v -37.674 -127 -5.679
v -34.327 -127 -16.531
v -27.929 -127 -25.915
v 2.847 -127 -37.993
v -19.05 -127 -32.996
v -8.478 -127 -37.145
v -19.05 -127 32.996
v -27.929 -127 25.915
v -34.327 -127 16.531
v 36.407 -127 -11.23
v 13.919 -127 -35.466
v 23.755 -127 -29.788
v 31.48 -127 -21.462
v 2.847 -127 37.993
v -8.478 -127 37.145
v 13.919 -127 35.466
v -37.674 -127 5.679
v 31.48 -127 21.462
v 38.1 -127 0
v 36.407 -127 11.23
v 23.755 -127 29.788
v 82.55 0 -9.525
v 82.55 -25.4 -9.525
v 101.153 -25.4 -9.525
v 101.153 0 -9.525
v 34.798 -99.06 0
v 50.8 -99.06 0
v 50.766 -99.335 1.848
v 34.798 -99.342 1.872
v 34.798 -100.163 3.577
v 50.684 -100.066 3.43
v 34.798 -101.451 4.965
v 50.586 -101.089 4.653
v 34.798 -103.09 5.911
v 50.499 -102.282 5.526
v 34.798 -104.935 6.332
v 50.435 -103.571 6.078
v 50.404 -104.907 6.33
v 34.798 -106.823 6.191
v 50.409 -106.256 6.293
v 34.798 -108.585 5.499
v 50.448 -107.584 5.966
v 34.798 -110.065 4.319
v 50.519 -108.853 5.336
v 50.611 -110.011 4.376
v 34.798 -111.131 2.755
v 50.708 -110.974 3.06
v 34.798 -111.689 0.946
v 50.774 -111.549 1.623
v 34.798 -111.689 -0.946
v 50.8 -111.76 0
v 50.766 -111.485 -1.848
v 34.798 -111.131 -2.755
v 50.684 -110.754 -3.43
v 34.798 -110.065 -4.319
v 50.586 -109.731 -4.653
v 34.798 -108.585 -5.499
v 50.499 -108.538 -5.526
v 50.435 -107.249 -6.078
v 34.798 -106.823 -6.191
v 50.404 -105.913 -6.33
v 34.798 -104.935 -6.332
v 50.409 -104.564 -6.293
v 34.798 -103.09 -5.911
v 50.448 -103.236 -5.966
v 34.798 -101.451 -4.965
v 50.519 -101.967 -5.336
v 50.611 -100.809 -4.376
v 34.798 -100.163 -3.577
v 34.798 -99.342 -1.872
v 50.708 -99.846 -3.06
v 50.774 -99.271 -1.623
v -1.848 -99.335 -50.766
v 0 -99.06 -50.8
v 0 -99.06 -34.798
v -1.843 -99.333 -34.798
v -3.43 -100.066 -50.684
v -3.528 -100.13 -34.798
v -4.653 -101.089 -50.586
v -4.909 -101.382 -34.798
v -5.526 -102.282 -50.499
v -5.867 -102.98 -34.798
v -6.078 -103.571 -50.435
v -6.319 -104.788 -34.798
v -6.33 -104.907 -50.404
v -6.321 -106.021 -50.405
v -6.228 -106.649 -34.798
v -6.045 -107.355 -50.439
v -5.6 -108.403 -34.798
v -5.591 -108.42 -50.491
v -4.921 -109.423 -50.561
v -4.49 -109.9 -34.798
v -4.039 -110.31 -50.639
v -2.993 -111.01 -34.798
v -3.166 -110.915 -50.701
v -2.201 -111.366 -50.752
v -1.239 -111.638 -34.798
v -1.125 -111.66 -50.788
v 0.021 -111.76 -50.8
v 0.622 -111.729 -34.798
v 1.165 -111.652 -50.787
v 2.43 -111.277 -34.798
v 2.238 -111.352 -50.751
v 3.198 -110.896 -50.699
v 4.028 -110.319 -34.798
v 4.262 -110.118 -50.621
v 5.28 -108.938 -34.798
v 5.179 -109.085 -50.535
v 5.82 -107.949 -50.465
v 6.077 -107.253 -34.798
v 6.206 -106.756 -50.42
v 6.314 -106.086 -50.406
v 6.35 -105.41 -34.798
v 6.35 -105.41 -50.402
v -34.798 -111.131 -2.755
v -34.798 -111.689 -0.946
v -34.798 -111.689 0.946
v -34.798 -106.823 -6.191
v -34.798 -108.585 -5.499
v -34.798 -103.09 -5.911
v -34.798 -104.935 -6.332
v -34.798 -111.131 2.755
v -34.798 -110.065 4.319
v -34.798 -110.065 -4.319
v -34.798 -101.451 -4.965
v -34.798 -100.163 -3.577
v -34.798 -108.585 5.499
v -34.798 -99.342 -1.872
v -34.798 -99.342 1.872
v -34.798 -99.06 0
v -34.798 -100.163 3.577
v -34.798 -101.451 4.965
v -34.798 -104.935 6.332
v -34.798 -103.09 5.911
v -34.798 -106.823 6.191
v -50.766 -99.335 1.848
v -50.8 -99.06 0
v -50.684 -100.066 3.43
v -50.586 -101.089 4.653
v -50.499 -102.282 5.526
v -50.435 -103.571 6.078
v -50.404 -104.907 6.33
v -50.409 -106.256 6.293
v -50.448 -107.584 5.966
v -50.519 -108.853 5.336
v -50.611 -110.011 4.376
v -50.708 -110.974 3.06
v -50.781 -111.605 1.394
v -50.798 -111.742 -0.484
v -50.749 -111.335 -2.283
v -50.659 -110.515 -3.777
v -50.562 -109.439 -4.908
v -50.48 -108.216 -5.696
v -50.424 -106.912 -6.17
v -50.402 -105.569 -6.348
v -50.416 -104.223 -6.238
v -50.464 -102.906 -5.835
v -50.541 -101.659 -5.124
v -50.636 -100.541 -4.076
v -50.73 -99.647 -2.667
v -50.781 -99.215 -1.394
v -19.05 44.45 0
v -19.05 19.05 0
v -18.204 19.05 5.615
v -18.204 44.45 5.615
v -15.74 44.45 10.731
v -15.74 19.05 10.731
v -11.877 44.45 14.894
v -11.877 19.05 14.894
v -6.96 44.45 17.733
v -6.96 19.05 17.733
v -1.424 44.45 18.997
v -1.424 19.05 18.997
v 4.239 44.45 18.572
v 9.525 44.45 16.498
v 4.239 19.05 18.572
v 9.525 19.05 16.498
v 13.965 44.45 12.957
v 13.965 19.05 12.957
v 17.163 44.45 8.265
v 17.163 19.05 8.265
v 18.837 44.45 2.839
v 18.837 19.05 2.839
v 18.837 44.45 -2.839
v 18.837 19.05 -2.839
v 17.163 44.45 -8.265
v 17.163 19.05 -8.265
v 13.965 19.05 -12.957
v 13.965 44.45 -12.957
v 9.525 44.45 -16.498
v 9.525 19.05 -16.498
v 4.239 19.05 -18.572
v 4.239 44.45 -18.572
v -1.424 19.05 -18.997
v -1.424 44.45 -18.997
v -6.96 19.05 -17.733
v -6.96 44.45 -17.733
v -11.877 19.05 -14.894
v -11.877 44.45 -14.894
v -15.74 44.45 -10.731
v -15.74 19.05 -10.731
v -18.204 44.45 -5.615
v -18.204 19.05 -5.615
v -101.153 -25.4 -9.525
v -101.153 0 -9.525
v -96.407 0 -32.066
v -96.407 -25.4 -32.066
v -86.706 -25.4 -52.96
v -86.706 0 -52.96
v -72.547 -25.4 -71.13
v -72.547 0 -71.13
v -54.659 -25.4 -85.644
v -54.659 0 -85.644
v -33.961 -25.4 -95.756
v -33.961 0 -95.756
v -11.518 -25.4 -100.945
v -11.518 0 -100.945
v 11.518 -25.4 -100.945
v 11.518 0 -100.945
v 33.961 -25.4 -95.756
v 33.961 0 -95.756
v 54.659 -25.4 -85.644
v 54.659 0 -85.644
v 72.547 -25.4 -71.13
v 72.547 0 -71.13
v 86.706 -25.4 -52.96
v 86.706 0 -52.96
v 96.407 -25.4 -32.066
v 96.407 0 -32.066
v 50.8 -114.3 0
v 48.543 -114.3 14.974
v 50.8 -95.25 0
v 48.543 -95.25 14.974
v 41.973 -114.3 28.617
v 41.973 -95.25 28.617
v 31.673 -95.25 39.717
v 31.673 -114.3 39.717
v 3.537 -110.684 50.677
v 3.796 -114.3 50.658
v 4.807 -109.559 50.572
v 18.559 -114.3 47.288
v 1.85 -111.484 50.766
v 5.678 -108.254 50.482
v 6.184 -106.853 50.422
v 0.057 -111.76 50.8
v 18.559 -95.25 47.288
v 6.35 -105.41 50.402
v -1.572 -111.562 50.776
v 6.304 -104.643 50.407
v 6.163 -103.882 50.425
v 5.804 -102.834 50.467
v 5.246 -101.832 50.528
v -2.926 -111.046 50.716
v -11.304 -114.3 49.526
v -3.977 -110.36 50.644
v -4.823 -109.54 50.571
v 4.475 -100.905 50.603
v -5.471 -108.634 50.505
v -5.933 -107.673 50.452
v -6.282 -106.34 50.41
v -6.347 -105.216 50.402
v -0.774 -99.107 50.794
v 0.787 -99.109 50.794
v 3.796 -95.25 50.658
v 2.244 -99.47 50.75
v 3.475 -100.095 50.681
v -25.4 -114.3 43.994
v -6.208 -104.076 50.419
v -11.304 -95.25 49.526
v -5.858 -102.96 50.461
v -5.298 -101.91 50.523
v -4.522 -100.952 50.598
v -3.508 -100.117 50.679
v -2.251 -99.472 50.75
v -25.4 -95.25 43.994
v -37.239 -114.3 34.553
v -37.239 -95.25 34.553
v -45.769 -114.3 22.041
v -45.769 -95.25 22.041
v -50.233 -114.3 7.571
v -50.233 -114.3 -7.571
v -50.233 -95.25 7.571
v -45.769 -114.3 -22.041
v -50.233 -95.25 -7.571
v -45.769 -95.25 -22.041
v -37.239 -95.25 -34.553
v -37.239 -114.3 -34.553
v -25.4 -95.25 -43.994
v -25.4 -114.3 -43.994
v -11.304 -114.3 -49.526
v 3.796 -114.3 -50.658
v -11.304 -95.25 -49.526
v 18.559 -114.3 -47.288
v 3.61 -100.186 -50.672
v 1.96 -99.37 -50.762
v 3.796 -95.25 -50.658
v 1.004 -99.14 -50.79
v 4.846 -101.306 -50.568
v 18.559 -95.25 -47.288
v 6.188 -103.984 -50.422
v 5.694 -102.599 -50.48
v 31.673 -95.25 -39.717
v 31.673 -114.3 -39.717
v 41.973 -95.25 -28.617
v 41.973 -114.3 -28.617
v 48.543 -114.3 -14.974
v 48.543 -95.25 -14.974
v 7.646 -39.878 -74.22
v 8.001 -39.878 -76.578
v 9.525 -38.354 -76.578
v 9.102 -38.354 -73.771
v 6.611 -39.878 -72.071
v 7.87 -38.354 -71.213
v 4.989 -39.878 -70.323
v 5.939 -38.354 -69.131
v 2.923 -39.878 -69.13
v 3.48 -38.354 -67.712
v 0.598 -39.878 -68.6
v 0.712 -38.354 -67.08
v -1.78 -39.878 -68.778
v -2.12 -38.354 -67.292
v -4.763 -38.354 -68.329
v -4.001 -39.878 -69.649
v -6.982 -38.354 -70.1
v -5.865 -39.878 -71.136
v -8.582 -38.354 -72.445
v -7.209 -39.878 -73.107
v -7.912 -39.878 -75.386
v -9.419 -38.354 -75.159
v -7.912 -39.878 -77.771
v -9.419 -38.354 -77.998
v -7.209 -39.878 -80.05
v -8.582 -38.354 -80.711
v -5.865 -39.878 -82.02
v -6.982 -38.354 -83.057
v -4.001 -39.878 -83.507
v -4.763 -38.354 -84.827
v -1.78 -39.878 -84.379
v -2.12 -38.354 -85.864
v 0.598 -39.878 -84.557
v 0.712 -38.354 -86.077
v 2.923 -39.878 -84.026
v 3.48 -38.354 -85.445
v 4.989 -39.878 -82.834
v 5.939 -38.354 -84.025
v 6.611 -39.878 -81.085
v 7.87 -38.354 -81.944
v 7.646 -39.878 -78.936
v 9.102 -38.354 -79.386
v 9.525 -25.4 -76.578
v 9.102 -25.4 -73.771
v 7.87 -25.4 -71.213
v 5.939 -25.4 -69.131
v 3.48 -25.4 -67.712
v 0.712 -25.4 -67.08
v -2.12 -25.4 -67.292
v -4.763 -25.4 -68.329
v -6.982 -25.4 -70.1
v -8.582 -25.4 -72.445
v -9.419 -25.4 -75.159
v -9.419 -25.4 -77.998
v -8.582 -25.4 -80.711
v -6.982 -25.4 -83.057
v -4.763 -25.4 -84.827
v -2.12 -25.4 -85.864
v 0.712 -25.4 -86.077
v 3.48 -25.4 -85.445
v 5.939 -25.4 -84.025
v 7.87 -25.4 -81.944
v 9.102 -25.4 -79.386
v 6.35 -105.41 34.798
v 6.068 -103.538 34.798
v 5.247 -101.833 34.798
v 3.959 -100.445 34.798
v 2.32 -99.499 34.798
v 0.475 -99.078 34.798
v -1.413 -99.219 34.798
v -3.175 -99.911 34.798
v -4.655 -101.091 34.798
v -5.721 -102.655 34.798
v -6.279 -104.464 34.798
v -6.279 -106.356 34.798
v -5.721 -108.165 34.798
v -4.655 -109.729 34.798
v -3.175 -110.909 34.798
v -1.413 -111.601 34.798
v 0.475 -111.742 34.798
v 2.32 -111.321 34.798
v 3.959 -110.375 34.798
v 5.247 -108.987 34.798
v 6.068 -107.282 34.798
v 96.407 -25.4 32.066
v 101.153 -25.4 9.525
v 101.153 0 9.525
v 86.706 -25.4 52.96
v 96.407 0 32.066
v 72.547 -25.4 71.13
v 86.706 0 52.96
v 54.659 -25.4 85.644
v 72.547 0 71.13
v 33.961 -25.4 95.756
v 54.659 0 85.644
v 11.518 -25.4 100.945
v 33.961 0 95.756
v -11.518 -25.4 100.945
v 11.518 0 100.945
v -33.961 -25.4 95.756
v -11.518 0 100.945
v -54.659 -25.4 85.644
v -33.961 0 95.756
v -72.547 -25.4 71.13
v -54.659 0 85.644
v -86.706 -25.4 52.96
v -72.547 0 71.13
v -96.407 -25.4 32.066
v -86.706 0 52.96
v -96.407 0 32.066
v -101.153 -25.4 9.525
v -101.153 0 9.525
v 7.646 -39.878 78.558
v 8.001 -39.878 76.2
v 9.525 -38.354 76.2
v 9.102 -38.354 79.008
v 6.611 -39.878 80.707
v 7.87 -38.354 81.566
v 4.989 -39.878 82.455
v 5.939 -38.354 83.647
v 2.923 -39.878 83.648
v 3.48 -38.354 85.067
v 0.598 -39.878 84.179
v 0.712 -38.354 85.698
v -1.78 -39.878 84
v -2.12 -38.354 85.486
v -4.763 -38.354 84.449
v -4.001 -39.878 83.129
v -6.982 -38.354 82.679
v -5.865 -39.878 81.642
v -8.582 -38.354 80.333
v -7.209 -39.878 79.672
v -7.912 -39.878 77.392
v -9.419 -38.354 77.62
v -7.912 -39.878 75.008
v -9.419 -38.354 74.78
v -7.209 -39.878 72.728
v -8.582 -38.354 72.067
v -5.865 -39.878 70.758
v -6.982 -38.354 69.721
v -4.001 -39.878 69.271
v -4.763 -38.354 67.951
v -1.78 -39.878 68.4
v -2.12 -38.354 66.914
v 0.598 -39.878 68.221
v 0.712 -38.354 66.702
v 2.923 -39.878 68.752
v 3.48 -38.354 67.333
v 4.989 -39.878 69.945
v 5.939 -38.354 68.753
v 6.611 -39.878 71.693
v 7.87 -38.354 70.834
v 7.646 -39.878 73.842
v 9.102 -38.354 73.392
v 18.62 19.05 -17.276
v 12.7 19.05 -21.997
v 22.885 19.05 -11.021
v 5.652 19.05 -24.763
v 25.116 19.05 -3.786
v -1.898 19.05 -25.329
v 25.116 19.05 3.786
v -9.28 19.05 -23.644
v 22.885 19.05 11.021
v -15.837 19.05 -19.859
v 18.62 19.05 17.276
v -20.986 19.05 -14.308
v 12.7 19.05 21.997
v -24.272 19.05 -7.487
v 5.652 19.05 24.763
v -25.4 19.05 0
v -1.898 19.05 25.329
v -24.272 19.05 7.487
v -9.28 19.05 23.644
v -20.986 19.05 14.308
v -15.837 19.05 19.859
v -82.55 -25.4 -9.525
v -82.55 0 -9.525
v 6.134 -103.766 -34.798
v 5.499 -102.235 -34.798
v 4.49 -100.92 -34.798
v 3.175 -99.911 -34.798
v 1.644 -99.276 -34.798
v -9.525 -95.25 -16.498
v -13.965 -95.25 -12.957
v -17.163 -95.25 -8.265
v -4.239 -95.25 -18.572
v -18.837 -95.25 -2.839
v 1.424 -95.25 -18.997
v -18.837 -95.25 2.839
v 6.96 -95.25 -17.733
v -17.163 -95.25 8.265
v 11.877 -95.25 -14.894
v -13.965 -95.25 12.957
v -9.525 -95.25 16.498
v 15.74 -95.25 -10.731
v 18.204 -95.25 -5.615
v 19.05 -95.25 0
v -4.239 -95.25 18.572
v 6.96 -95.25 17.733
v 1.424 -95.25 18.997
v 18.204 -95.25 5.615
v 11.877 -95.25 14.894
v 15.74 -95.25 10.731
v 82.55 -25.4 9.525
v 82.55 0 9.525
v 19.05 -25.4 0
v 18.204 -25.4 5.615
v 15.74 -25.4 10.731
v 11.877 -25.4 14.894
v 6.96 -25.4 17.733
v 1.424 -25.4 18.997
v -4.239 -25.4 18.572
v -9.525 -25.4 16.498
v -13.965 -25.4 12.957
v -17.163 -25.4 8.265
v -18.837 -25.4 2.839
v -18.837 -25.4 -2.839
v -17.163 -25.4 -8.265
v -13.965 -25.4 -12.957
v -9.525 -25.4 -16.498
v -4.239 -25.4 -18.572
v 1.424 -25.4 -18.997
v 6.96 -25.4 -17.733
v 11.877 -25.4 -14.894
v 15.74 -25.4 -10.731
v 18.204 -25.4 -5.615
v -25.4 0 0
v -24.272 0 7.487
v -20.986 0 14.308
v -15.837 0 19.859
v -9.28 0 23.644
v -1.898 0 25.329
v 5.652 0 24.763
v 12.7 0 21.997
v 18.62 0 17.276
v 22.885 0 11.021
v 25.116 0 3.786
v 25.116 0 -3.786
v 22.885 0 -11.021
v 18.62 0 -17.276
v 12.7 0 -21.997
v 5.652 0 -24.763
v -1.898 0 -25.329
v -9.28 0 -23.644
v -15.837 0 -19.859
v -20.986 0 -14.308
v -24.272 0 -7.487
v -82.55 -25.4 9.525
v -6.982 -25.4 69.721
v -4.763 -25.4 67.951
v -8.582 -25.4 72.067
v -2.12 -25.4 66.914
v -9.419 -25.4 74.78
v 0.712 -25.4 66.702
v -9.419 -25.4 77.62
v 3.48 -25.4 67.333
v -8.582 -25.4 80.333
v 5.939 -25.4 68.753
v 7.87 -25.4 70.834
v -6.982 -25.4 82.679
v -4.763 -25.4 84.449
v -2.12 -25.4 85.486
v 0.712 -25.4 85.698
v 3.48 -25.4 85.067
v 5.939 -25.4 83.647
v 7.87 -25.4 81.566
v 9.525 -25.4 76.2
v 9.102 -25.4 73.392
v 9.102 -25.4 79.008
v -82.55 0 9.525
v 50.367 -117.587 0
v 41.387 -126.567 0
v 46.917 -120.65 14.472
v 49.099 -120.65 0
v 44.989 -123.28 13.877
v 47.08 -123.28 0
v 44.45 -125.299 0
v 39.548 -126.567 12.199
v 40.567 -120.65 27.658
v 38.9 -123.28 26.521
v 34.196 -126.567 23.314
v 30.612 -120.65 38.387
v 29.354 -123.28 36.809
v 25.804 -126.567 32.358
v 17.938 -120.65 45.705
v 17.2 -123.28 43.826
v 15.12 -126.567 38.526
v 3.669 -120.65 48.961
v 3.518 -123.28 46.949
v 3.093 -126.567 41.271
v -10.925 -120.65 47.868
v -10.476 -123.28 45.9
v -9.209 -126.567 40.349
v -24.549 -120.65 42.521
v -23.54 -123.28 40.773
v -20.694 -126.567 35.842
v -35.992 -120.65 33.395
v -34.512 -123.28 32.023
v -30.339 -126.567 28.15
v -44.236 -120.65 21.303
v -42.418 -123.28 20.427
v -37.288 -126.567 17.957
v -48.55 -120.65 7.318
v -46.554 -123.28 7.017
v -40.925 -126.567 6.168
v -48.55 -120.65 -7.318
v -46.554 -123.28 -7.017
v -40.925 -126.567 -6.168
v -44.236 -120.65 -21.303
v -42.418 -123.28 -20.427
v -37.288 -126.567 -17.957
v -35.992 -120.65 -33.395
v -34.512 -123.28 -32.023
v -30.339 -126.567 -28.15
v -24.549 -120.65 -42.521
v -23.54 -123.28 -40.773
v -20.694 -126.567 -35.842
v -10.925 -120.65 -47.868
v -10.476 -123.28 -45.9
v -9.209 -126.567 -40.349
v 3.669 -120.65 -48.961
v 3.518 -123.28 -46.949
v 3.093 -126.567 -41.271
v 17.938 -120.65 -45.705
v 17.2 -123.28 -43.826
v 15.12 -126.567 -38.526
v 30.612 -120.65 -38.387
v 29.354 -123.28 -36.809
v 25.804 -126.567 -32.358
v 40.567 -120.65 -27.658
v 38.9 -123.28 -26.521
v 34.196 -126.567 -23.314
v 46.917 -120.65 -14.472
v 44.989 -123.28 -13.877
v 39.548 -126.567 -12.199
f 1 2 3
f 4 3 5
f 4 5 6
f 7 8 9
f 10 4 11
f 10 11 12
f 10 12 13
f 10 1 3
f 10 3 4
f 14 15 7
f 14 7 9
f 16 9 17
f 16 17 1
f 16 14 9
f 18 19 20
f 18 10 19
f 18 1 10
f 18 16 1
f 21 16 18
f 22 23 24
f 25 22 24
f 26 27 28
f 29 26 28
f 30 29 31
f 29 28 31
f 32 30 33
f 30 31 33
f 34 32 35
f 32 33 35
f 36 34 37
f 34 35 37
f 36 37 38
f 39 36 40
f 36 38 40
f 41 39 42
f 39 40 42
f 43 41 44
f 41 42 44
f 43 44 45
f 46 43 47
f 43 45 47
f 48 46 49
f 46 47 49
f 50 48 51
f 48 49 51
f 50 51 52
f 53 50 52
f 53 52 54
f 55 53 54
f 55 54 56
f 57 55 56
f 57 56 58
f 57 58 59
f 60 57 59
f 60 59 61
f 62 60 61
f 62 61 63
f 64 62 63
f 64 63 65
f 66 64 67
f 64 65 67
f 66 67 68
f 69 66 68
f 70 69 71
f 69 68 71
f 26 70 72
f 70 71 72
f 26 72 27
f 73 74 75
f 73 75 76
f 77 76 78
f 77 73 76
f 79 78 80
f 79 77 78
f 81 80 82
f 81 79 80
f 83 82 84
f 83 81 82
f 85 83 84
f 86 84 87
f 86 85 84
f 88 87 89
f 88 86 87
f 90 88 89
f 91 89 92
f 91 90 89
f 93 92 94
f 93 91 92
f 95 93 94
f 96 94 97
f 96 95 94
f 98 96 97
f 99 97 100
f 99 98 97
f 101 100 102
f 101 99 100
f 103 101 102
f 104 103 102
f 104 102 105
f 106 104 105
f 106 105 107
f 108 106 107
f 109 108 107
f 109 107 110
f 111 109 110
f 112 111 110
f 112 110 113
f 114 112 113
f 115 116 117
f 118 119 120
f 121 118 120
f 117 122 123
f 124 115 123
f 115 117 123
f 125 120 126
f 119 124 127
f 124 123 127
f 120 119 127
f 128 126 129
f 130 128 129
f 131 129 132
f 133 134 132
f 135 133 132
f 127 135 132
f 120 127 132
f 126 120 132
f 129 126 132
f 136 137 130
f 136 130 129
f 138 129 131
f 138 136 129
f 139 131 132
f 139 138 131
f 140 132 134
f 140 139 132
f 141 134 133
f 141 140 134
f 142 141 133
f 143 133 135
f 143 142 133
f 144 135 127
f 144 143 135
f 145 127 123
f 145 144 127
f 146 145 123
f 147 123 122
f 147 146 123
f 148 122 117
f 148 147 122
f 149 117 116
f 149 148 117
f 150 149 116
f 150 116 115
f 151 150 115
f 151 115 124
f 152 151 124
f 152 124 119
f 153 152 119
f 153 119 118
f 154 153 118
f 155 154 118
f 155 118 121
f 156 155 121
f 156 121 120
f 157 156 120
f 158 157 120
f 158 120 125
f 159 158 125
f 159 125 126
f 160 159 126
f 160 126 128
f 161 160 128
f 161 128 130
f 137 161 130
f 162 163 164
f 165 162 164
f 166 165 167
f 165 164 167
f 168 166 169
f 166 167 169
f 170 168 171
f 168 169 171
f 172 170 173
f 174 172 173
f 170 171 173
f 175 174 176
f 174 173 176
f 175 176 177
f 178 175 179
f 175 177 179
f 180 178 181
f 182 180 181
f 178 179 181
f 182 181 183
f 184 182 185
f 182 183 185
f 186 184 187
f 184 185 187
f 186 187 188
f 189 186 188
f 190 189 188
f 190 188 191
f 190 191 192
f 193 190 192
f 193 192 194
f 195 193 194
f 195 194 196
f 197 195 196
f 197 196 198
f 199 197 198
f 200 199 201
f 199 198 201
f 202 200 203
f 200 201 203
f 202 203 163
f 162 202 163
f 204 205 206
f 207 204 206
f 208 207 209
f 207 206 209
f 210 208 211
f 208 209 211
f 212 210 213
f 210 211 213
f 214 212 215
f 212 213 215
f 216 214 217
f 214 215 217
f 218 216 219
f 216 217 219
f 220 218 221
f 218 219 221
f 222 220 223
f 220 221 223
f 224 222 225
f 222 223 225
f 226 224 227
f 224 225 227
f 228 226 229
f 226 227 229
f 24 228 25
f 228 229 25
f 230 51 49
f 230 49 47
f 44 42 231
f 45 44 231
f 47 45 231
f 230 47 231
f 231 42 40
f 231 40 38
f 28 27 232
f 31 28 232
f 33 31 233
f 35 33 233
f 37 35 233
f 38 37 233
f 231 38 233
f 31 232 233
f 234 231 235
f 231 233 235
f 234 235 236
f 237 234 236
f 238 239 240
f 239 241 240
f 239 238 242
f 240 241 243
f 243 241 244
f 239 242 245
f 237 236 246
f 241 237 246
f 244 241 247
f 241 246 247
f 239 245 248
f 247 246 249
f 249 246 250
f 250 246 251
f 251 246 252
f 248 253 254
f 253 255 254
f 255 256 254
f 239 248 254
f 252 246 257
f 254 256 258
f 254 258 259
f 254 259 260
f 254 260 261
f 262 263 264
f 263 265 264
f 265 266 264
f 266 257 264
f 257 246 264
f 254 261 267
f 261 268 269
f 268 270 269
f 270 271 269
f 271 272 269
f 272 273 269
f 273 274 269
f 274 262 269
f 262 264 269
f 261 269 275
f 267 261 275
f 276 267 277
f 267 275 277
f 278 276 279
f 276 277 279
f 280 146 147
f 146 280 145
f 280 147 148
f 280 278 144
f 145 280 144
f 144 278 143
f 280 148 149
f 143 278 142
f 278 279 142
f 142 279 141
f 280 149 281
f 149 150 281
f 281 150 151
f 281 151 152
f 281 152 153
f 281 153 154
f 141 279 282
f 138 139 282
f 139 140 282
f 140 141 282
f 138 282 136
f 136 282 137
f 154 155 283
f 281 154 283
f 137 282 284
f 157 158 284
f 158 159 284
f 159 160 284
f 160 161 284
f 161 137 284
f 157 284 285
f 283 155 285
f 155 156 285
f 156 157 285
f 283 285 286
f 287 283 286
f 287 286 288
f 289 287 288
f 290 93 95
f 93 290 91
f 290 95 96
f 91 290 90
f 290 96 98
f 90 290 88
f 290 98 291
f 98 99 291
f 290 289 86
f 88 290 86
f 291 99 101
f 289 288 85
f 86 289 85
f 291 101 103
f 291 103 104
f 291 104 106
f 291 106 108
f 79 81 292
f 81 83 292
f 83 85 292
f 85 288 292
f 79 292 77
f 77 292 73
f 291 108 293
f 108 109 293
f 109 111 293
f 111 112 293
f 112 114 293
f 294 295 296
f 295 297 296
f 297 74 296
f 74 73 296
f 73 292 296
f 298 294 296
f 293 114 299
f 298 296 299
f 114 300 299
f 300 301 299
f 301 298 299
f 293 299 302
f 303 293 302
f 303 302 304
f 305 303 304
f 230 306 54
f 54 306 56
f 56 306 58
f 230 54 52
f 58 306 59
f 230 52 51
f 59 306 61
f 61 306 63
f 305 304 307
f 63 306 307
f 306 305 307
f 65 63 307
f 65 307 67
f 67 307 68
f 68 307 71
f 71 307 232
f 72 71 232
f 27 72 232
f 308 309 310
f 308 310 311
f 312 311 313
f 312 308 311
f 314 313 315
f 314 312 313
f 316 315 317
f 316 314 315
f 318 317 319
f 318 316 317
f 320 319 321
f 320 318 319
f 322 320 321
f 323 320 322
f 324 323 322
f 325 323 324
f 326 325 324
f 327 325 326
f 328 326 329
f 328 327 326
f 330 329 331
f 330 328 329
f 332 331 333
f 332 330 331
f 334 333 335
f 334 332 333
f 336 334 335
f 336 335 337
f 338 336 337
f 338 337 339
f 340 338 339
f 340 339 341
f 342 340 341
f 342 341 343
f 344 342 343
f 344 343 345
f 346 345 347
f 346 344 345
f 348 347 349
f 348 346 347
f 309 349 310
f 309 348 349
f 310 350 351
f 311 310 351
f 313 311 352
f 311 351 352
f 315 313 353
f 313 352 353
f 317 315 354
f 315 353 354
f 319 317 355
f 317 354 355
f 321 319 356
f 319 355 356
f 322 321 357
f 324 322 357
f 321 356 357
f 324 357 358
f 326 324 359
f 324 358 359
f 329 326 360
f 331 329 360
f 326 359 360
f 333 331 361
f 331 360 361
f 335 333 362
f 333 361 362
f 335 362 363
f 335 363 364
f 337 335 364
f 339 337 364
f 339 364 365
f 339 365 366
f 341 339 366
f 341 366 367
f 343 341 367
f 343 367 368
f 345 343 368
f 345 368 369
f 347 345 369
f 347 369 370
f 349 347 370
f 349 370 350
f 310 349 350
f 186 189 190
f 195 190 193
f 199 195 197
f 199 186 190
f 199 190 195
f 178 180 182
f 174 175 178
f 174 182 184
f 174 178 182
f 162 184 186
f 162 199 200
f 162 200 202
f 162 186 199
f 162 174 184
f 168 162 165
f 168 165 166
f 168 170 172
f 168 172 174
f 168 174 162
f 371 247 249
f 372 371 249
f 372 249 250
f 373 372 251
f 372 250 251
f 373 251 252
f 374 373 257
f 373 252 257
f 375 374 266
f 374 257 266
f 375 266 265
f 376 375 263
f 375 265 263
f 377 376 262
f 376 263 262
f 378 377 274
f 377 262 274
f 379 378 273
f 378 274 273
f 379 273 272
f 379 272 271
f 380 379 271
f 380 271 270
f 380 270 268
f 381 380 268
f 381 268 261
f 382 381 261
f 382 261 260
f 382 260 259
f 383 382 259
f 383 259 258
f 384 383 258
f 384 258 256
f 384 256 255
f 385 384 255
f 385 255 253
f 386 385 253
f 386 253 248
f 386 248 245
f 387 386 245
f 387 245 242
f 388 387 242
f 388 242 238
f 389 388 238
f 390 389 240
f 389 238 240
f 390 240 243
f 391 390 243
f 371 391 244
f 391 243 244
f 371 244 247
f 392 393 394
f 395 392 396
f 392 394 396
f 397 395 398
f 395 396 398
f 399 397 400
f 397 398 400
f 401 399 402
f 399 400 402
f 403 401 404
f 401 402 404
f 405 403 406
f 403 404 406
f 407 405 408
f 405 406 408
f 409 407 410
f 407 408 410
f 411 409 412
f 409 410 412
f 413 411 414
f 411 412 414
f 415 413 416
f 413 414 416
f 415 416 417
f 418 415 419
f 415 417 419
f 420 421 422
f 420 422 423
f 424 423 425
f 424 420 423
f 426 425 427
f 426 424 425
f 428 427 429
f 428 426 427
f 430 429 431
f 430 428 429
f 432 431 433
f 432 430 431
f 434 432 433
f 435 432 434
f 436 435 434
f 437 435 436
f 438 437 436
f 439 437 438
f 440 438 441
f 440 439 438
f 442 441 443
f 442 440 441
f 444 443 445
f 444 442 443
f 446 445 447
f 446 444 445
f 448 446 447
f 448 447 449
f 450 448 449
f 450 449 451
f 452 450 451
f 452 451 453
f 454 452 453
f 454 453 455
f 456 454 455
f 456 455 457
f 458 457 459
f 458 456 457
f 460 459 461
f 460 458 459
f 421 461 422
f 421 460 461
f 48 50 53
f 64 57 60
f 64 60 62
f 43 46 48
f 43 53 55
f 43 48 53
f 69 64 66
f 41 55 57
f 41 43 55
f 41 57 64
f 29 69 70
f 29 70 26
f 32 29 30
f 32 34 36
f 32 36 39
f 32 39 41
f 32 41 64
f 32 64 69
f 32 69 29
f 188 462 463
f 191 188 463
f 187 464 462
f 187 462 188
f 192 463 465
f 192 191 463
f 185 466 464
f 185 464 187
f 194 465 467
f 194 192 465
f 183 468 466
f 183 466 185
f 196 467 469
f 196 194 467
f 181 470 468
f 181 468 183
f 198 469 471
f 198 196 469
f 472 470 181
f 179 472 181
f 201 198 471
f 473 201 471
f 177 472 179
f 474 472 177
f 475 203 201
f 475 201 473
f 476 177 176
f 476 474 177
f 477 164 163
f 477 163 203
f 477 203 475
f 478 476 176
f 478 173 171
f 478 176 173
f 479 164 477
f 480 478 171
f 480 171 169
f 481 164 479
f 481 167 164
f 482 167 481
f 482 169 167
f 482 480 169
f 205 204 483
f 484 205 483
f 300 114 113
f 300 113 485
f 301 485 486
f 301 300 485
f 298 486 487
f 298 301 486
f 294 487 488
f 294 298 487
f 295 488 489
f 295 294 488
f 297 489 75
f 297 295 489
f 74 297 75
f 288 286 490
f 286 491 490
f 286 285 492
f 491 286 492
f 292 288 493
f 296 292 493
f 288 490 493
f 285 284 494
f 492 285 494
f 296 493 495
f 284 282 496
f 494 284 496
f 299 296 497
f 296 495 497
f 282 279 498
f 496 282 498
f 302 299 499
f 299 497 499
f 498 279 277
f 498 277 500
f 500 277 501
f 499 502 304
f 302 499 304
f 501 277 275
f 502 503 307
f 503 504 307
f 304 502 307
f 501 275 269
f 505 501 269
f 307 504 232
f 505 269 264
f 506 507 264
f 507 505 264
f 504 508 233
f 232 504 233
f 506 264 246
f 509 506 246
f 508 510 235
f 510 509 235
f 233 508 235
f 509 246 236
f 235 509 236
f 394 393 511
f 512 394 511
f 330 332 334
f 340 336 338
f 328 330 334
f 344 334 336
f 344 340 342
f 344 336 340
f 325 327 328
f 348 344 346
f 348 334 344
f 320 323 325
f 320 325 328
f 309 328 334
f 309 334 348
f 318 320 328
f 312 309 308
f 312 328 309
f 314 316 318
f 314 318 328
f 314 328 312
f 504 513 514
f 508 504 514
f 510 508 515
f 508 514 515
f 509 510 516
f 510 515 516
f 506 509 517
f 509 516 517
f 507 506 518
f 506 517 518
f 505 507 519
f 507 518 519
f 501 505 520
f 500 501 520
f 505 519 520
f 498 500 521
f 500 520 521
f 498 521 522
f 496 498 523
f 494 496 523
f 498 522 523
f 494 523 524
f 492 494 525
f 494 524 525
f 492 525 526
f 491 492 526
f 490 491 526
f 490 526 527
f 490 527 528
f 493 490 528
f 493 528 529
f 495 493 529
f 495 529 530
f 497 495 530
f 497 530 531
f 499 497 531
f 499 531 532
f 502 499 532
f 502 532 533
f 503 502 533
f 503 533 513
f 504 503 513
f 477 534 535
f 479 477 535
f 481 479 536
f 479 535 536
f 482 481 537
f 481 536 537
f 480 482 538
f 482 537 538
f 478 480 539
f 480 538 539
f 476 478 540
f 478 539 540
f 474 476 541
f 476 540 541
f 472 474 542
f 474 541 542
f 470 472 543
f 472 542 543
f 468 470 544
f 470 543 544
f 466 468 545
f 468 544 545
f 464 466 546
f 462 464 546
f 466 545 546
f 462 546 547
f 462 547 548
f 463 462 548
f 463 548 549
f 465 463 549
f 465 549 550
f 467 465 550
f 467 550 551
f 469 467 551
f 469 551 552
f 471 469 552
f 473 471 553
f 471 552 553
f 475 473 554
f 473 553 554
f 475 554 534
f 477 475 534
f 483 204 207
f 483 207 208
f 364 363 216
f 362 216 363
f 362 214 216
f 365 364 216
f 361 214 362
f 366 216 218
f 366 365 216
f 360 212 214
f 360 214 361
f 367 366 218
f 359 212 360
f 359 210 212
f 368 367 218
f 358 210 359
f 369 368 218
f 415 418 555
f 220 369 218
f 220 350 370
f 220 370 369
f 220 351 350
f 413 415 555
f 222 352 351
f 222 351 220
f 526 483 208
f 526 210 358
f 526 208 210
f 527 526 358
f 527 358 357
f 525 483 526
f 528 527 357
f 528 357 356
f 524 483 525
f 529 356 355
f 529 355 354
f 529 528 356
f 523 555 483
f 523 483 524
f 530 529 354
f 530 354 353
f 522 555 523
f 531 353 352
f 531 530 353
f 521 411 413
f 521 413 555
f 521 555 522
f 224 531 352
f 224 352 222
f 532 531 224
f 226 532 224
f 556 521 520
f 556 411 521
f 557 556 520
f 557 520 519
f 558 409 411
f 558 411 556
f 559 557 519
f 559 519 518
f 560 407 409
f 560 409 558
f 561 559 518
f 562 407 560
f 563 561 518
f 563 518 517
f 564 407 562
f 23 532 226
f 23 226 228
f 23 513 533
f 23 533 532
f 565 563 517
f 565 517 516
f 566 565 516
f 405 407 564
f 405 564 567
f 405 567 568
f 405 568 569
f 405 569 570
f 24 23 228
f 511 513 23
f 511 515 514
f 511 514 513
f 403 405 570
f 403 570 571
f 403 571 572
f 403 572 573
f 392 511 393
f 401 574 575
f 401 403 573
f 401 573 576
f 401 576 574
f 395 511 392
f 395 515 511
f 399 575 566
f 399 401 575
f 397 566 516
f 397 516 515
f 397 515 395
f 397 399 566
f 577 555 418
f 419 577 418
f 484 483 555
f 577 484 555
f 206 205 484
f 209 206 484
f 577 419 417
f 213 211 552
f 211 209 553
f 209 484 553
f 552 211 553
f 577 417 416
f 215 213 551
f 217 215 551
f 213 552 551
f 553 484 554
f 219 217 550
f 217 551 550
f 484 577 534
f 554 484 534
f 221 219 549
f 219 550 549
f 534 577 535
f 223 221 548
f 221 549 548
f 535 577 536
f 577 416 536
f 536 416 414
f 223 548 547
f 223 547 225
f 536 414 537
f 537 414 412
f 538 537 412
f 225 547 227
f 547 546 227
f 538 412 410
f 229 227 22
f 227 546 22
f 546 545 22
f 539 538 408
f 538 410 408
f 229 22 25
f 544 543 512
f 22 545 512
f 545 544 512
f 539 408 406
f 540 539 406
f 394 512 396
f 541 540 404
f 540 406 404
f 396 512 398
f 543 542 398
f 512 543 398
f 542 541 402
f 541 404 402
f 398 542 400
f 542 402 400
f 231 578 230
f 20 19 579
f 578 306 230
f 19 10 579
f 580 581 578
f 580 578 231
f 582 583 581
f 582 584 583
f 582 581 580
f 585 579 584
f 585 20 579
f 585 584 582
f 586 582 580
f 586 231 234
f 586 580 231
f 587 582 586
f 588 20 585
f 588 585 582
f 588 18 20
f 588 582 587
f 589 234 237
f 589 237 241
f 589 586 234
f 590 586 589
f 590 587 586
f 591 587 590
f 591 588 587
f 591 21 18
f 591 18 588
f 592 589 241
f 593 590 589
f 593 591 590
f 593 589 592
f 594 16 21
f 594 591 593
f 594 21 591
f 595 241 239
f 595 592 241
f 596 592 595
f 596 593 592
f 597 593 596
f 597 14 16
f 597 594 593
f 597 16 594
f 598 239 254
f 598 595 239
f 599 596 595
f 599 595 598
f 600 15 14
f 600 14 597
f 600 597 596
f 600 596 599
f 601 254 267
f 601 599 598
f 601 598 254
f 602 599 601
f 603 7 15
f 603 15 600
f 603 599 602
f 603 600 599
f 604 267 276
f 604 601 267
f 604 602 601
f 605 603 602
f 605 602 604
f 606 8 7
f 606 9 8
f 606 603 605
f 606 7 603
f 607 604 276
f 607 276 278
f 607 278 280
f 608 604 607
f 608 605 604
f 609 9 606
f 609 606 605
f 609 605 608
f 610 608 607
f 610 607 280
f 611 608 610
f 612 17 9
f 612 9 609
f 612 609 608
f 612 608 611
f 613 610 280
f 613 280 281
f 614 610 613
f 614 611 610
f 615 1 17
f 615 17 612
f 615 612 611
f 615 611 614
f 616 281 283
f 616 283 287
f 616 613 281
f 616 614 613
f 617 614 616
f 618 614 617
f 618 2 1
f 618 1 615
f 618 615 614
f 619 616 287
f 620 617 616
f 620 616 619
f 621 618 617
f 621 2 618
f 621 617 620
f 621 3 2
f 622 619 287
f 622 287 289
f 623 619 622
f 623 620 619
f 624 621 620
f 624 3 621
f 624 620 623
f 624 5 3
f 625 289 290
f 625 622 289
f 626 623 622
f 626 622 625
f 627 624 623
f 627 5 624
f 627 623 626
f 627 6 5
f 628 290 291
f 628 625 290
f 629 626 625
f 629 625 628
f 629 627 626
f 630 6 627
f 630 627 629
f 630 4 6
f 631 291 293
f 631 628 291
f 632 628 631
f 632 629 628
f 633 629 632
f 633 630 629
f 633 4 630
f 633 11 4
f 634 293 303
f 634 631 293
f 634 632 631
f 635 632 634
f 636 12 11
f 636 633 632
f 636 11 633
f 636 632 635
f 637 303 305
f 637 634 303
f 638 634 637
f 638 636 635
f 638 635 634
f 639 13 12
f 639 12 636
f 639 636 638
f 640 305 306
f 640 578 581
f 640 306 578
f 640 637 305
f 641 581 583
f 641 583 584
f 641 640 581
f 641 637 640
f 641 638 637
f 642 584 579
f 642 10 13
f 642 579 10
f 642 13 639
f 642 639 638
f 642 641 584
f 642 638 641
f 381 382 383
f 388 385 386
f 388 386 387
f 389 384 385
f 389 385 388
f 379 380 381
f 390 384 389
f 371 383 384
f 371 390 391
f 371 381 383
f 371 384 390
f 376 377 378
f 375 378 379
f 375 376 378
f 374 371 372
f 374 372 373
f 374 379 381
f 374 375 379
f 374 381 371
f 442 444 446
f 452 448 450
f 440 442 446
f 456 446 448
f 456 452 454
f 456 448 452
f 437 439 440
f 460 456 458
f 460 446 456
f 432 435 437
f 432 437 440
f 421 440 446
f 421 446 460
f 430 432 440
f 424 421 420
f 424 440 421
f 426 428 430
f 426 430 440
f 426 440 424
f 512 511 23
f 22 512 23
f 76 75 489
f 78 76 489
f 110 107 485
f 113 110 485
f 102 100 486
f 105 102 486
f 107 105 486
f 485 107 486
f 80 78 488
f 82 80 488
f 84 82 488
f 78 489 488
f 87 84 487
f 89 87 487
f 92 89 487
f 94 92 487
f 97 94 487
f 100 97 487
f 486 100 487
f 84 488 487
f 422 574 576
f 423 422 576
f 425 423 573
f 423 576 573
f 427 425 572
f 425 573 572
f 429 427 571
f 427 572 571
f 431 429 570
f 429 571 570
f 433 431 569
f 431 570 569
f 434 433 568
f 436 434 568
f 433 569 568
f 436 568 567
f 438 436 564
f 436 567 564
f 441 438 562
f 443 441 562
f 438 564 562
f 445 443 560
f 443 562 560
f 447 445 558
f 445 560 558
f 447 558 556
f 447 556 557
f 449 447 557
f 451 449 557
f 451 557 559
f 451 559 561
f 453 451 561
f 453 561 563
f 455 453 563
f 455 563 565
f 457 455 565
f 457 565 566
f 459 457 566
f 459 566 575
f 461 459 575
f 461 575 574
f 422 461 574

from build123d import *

# Parameters (mm, degrees)
F0_R      = 101.6
F1_DEPTH  = 19.05
F2_R      = 19.05
F3_DEPTH  = 76.2
F4_R      = 50.8
F4_R_2    = 19.05
F5_DEPTH  = 31.75
F6_R      = 9.525
F7_DEPTH  = 20.828
F8_R      = 12.7
F9_R      = 25.4
F10_DEPTH = 19.05
F11_R     = 19.05
F12_DEPTH = 25.4
F13_DEPTH = 25.4
F15_DEPTH = 27.94
F17_DEPTH = 25.4
F18_SIZE2 = 1.524
F18_SIZE  = 1.524
F20_R     = 6.35
F21_DEPTH = 16.002
F24_DEPTH = 16.002
F26_R     = 6.35
F27_DEPTH = 16.002
F29_R     = 6.35
F30_DEPTH = 16.002


with BuildPart() as f1:
    # F0 (on Front) → F1 (new body)
    with BuildSketch(Plane.XZ):
        Circle(F0_R)
    extrude(amount=F1_DEPTH)

    # F2 (on face) → F3 (join)
    with BuildSketch(Plane.XZ.offset(19.05)):
        Circle(F2_R)
    extrude(amount=F3_DEPTH)

    # F4 (on face) → F5 (join)
    with BuildSketch(Plane.XZ.offset(95.25)):
        Circle(F4_R)
        Circle(F4_R_2, mode=Mode.SUBTRACT)
        Circle(F4_R_2)
    extrude(amount=F5_DEPTH)

    # F6 (on face) → F7 (join)
    with BuildSketch(Plane.XZ.offset(19.05)):
        with Locations((0, 76.2)):
            Circle(F6_R)
        with Locations((0, -76.578163)):
            Circle(F6_R)
    extrude(amount=F7_DEPTH)

    # F8
    f8_edges = [f1.edges().sort_by_distance(p)[0] for p in [
        (-50.8, -127, 0),
    ]]
    fillet(f8_edges, radius=F8_R)

    # F9 (on face) → F10 (join)
    with BuildSketch(Plane(origin=(0, 0, 0), x_dir=(-1, 0, 0), z_dir=(0, 1, 0))):
        Circle(F9_R)
    extrude(amount=F10_DEPTH)

    # F11 (on face) → F12 (join)
    with BuildSketch(Plane(origin=(0, 19.05, 0), x_dir=(-1, 0, 0), z_dir=(0, 1, 0))):
        Circle(F11_R)
    extrude(amount=F12_DEPTH)

    # F0 (on Front) → F13 (join)
    with BuildSketch(Plane.XZ):
        Circle(F0_R)
    extrude(amount=F13_DEPTH)

    # F14 (on face) → F15 (cut)
    with BuildSketch(Plane.XZ.offset(25.4)):
        Polygon((82.55, 9.525), (82.55, 0), (82.55, -9.525), (120.547909, -9.525), (120.547909, 9.525), align=None)
    extrude(amount=-F15_DEPTH, mode=Mode.SUBTRACT)

    # F16 (on face) → F17 (cut)
    with BuildSketch(Plane.XZ.offset(25.4)):
        Polygon((-82.55, -9.525), (-82.55, 0), (-82.55, 9.525), (-117.500194, 9.525), (-117.500194, -9.525), align=None)
    extrude(amount=-F17_DEPTH, mode=Mode.SUBTRACT)

    # F18
    f18_edges = [f1.edges().sort_by_distance(p)[0] for p in [
        (-9.525, -39.878, 76.2),
        (-9.525, -39.878, -76.578163),
    ]]
    chamfer(f18_edges, length=F18_SIZE, length2=F18_SIZE2)

    # F20 (on offset) → F21 (cut)
    with BuildSketch(Plane.XY.offset(50.8)):
        with Locations((0, -105.41)):
            Circle(F20_R)
    extrude(amount=-F21_DEPTH, mode=Mode.SUBTRACT)

    # F23 (on offset) → F24 (cut)
    with BuildSketch(Plane.XY.offset(-50.8)):
        with BuildLine():
            ThreePointArc((0, -99.06), (-4.490128, -109.900128), (6.35, -105.41))
            ThreePointArc((6.35, -105.41), (4.490128, -100.919872), (0, -99.06))
        make_face()
    extrude(amount=F24_DEPTH, mode=Mode.SUBTRACT)

    # F26 (on offset) → F27 (cut)
    with BuildSketch(Plane.YZ.offset(50.8)):
        with Locations((-105.41, 0)):
            Circle(F26_R)
    extrude(amount=-F27_DEPTH, mode=Mode.SUBTRACT)

    # F29 (on offset) → F30 (cut)
    with BuildSketch(Plane.YZ.offset(-50.8)):
        with Locations((-105.41, 0)):
            Circle(F29_R)
    extrude(amount=F30_DEPTH, mode=Mode.SUBTRACT)


solid = f1.part
